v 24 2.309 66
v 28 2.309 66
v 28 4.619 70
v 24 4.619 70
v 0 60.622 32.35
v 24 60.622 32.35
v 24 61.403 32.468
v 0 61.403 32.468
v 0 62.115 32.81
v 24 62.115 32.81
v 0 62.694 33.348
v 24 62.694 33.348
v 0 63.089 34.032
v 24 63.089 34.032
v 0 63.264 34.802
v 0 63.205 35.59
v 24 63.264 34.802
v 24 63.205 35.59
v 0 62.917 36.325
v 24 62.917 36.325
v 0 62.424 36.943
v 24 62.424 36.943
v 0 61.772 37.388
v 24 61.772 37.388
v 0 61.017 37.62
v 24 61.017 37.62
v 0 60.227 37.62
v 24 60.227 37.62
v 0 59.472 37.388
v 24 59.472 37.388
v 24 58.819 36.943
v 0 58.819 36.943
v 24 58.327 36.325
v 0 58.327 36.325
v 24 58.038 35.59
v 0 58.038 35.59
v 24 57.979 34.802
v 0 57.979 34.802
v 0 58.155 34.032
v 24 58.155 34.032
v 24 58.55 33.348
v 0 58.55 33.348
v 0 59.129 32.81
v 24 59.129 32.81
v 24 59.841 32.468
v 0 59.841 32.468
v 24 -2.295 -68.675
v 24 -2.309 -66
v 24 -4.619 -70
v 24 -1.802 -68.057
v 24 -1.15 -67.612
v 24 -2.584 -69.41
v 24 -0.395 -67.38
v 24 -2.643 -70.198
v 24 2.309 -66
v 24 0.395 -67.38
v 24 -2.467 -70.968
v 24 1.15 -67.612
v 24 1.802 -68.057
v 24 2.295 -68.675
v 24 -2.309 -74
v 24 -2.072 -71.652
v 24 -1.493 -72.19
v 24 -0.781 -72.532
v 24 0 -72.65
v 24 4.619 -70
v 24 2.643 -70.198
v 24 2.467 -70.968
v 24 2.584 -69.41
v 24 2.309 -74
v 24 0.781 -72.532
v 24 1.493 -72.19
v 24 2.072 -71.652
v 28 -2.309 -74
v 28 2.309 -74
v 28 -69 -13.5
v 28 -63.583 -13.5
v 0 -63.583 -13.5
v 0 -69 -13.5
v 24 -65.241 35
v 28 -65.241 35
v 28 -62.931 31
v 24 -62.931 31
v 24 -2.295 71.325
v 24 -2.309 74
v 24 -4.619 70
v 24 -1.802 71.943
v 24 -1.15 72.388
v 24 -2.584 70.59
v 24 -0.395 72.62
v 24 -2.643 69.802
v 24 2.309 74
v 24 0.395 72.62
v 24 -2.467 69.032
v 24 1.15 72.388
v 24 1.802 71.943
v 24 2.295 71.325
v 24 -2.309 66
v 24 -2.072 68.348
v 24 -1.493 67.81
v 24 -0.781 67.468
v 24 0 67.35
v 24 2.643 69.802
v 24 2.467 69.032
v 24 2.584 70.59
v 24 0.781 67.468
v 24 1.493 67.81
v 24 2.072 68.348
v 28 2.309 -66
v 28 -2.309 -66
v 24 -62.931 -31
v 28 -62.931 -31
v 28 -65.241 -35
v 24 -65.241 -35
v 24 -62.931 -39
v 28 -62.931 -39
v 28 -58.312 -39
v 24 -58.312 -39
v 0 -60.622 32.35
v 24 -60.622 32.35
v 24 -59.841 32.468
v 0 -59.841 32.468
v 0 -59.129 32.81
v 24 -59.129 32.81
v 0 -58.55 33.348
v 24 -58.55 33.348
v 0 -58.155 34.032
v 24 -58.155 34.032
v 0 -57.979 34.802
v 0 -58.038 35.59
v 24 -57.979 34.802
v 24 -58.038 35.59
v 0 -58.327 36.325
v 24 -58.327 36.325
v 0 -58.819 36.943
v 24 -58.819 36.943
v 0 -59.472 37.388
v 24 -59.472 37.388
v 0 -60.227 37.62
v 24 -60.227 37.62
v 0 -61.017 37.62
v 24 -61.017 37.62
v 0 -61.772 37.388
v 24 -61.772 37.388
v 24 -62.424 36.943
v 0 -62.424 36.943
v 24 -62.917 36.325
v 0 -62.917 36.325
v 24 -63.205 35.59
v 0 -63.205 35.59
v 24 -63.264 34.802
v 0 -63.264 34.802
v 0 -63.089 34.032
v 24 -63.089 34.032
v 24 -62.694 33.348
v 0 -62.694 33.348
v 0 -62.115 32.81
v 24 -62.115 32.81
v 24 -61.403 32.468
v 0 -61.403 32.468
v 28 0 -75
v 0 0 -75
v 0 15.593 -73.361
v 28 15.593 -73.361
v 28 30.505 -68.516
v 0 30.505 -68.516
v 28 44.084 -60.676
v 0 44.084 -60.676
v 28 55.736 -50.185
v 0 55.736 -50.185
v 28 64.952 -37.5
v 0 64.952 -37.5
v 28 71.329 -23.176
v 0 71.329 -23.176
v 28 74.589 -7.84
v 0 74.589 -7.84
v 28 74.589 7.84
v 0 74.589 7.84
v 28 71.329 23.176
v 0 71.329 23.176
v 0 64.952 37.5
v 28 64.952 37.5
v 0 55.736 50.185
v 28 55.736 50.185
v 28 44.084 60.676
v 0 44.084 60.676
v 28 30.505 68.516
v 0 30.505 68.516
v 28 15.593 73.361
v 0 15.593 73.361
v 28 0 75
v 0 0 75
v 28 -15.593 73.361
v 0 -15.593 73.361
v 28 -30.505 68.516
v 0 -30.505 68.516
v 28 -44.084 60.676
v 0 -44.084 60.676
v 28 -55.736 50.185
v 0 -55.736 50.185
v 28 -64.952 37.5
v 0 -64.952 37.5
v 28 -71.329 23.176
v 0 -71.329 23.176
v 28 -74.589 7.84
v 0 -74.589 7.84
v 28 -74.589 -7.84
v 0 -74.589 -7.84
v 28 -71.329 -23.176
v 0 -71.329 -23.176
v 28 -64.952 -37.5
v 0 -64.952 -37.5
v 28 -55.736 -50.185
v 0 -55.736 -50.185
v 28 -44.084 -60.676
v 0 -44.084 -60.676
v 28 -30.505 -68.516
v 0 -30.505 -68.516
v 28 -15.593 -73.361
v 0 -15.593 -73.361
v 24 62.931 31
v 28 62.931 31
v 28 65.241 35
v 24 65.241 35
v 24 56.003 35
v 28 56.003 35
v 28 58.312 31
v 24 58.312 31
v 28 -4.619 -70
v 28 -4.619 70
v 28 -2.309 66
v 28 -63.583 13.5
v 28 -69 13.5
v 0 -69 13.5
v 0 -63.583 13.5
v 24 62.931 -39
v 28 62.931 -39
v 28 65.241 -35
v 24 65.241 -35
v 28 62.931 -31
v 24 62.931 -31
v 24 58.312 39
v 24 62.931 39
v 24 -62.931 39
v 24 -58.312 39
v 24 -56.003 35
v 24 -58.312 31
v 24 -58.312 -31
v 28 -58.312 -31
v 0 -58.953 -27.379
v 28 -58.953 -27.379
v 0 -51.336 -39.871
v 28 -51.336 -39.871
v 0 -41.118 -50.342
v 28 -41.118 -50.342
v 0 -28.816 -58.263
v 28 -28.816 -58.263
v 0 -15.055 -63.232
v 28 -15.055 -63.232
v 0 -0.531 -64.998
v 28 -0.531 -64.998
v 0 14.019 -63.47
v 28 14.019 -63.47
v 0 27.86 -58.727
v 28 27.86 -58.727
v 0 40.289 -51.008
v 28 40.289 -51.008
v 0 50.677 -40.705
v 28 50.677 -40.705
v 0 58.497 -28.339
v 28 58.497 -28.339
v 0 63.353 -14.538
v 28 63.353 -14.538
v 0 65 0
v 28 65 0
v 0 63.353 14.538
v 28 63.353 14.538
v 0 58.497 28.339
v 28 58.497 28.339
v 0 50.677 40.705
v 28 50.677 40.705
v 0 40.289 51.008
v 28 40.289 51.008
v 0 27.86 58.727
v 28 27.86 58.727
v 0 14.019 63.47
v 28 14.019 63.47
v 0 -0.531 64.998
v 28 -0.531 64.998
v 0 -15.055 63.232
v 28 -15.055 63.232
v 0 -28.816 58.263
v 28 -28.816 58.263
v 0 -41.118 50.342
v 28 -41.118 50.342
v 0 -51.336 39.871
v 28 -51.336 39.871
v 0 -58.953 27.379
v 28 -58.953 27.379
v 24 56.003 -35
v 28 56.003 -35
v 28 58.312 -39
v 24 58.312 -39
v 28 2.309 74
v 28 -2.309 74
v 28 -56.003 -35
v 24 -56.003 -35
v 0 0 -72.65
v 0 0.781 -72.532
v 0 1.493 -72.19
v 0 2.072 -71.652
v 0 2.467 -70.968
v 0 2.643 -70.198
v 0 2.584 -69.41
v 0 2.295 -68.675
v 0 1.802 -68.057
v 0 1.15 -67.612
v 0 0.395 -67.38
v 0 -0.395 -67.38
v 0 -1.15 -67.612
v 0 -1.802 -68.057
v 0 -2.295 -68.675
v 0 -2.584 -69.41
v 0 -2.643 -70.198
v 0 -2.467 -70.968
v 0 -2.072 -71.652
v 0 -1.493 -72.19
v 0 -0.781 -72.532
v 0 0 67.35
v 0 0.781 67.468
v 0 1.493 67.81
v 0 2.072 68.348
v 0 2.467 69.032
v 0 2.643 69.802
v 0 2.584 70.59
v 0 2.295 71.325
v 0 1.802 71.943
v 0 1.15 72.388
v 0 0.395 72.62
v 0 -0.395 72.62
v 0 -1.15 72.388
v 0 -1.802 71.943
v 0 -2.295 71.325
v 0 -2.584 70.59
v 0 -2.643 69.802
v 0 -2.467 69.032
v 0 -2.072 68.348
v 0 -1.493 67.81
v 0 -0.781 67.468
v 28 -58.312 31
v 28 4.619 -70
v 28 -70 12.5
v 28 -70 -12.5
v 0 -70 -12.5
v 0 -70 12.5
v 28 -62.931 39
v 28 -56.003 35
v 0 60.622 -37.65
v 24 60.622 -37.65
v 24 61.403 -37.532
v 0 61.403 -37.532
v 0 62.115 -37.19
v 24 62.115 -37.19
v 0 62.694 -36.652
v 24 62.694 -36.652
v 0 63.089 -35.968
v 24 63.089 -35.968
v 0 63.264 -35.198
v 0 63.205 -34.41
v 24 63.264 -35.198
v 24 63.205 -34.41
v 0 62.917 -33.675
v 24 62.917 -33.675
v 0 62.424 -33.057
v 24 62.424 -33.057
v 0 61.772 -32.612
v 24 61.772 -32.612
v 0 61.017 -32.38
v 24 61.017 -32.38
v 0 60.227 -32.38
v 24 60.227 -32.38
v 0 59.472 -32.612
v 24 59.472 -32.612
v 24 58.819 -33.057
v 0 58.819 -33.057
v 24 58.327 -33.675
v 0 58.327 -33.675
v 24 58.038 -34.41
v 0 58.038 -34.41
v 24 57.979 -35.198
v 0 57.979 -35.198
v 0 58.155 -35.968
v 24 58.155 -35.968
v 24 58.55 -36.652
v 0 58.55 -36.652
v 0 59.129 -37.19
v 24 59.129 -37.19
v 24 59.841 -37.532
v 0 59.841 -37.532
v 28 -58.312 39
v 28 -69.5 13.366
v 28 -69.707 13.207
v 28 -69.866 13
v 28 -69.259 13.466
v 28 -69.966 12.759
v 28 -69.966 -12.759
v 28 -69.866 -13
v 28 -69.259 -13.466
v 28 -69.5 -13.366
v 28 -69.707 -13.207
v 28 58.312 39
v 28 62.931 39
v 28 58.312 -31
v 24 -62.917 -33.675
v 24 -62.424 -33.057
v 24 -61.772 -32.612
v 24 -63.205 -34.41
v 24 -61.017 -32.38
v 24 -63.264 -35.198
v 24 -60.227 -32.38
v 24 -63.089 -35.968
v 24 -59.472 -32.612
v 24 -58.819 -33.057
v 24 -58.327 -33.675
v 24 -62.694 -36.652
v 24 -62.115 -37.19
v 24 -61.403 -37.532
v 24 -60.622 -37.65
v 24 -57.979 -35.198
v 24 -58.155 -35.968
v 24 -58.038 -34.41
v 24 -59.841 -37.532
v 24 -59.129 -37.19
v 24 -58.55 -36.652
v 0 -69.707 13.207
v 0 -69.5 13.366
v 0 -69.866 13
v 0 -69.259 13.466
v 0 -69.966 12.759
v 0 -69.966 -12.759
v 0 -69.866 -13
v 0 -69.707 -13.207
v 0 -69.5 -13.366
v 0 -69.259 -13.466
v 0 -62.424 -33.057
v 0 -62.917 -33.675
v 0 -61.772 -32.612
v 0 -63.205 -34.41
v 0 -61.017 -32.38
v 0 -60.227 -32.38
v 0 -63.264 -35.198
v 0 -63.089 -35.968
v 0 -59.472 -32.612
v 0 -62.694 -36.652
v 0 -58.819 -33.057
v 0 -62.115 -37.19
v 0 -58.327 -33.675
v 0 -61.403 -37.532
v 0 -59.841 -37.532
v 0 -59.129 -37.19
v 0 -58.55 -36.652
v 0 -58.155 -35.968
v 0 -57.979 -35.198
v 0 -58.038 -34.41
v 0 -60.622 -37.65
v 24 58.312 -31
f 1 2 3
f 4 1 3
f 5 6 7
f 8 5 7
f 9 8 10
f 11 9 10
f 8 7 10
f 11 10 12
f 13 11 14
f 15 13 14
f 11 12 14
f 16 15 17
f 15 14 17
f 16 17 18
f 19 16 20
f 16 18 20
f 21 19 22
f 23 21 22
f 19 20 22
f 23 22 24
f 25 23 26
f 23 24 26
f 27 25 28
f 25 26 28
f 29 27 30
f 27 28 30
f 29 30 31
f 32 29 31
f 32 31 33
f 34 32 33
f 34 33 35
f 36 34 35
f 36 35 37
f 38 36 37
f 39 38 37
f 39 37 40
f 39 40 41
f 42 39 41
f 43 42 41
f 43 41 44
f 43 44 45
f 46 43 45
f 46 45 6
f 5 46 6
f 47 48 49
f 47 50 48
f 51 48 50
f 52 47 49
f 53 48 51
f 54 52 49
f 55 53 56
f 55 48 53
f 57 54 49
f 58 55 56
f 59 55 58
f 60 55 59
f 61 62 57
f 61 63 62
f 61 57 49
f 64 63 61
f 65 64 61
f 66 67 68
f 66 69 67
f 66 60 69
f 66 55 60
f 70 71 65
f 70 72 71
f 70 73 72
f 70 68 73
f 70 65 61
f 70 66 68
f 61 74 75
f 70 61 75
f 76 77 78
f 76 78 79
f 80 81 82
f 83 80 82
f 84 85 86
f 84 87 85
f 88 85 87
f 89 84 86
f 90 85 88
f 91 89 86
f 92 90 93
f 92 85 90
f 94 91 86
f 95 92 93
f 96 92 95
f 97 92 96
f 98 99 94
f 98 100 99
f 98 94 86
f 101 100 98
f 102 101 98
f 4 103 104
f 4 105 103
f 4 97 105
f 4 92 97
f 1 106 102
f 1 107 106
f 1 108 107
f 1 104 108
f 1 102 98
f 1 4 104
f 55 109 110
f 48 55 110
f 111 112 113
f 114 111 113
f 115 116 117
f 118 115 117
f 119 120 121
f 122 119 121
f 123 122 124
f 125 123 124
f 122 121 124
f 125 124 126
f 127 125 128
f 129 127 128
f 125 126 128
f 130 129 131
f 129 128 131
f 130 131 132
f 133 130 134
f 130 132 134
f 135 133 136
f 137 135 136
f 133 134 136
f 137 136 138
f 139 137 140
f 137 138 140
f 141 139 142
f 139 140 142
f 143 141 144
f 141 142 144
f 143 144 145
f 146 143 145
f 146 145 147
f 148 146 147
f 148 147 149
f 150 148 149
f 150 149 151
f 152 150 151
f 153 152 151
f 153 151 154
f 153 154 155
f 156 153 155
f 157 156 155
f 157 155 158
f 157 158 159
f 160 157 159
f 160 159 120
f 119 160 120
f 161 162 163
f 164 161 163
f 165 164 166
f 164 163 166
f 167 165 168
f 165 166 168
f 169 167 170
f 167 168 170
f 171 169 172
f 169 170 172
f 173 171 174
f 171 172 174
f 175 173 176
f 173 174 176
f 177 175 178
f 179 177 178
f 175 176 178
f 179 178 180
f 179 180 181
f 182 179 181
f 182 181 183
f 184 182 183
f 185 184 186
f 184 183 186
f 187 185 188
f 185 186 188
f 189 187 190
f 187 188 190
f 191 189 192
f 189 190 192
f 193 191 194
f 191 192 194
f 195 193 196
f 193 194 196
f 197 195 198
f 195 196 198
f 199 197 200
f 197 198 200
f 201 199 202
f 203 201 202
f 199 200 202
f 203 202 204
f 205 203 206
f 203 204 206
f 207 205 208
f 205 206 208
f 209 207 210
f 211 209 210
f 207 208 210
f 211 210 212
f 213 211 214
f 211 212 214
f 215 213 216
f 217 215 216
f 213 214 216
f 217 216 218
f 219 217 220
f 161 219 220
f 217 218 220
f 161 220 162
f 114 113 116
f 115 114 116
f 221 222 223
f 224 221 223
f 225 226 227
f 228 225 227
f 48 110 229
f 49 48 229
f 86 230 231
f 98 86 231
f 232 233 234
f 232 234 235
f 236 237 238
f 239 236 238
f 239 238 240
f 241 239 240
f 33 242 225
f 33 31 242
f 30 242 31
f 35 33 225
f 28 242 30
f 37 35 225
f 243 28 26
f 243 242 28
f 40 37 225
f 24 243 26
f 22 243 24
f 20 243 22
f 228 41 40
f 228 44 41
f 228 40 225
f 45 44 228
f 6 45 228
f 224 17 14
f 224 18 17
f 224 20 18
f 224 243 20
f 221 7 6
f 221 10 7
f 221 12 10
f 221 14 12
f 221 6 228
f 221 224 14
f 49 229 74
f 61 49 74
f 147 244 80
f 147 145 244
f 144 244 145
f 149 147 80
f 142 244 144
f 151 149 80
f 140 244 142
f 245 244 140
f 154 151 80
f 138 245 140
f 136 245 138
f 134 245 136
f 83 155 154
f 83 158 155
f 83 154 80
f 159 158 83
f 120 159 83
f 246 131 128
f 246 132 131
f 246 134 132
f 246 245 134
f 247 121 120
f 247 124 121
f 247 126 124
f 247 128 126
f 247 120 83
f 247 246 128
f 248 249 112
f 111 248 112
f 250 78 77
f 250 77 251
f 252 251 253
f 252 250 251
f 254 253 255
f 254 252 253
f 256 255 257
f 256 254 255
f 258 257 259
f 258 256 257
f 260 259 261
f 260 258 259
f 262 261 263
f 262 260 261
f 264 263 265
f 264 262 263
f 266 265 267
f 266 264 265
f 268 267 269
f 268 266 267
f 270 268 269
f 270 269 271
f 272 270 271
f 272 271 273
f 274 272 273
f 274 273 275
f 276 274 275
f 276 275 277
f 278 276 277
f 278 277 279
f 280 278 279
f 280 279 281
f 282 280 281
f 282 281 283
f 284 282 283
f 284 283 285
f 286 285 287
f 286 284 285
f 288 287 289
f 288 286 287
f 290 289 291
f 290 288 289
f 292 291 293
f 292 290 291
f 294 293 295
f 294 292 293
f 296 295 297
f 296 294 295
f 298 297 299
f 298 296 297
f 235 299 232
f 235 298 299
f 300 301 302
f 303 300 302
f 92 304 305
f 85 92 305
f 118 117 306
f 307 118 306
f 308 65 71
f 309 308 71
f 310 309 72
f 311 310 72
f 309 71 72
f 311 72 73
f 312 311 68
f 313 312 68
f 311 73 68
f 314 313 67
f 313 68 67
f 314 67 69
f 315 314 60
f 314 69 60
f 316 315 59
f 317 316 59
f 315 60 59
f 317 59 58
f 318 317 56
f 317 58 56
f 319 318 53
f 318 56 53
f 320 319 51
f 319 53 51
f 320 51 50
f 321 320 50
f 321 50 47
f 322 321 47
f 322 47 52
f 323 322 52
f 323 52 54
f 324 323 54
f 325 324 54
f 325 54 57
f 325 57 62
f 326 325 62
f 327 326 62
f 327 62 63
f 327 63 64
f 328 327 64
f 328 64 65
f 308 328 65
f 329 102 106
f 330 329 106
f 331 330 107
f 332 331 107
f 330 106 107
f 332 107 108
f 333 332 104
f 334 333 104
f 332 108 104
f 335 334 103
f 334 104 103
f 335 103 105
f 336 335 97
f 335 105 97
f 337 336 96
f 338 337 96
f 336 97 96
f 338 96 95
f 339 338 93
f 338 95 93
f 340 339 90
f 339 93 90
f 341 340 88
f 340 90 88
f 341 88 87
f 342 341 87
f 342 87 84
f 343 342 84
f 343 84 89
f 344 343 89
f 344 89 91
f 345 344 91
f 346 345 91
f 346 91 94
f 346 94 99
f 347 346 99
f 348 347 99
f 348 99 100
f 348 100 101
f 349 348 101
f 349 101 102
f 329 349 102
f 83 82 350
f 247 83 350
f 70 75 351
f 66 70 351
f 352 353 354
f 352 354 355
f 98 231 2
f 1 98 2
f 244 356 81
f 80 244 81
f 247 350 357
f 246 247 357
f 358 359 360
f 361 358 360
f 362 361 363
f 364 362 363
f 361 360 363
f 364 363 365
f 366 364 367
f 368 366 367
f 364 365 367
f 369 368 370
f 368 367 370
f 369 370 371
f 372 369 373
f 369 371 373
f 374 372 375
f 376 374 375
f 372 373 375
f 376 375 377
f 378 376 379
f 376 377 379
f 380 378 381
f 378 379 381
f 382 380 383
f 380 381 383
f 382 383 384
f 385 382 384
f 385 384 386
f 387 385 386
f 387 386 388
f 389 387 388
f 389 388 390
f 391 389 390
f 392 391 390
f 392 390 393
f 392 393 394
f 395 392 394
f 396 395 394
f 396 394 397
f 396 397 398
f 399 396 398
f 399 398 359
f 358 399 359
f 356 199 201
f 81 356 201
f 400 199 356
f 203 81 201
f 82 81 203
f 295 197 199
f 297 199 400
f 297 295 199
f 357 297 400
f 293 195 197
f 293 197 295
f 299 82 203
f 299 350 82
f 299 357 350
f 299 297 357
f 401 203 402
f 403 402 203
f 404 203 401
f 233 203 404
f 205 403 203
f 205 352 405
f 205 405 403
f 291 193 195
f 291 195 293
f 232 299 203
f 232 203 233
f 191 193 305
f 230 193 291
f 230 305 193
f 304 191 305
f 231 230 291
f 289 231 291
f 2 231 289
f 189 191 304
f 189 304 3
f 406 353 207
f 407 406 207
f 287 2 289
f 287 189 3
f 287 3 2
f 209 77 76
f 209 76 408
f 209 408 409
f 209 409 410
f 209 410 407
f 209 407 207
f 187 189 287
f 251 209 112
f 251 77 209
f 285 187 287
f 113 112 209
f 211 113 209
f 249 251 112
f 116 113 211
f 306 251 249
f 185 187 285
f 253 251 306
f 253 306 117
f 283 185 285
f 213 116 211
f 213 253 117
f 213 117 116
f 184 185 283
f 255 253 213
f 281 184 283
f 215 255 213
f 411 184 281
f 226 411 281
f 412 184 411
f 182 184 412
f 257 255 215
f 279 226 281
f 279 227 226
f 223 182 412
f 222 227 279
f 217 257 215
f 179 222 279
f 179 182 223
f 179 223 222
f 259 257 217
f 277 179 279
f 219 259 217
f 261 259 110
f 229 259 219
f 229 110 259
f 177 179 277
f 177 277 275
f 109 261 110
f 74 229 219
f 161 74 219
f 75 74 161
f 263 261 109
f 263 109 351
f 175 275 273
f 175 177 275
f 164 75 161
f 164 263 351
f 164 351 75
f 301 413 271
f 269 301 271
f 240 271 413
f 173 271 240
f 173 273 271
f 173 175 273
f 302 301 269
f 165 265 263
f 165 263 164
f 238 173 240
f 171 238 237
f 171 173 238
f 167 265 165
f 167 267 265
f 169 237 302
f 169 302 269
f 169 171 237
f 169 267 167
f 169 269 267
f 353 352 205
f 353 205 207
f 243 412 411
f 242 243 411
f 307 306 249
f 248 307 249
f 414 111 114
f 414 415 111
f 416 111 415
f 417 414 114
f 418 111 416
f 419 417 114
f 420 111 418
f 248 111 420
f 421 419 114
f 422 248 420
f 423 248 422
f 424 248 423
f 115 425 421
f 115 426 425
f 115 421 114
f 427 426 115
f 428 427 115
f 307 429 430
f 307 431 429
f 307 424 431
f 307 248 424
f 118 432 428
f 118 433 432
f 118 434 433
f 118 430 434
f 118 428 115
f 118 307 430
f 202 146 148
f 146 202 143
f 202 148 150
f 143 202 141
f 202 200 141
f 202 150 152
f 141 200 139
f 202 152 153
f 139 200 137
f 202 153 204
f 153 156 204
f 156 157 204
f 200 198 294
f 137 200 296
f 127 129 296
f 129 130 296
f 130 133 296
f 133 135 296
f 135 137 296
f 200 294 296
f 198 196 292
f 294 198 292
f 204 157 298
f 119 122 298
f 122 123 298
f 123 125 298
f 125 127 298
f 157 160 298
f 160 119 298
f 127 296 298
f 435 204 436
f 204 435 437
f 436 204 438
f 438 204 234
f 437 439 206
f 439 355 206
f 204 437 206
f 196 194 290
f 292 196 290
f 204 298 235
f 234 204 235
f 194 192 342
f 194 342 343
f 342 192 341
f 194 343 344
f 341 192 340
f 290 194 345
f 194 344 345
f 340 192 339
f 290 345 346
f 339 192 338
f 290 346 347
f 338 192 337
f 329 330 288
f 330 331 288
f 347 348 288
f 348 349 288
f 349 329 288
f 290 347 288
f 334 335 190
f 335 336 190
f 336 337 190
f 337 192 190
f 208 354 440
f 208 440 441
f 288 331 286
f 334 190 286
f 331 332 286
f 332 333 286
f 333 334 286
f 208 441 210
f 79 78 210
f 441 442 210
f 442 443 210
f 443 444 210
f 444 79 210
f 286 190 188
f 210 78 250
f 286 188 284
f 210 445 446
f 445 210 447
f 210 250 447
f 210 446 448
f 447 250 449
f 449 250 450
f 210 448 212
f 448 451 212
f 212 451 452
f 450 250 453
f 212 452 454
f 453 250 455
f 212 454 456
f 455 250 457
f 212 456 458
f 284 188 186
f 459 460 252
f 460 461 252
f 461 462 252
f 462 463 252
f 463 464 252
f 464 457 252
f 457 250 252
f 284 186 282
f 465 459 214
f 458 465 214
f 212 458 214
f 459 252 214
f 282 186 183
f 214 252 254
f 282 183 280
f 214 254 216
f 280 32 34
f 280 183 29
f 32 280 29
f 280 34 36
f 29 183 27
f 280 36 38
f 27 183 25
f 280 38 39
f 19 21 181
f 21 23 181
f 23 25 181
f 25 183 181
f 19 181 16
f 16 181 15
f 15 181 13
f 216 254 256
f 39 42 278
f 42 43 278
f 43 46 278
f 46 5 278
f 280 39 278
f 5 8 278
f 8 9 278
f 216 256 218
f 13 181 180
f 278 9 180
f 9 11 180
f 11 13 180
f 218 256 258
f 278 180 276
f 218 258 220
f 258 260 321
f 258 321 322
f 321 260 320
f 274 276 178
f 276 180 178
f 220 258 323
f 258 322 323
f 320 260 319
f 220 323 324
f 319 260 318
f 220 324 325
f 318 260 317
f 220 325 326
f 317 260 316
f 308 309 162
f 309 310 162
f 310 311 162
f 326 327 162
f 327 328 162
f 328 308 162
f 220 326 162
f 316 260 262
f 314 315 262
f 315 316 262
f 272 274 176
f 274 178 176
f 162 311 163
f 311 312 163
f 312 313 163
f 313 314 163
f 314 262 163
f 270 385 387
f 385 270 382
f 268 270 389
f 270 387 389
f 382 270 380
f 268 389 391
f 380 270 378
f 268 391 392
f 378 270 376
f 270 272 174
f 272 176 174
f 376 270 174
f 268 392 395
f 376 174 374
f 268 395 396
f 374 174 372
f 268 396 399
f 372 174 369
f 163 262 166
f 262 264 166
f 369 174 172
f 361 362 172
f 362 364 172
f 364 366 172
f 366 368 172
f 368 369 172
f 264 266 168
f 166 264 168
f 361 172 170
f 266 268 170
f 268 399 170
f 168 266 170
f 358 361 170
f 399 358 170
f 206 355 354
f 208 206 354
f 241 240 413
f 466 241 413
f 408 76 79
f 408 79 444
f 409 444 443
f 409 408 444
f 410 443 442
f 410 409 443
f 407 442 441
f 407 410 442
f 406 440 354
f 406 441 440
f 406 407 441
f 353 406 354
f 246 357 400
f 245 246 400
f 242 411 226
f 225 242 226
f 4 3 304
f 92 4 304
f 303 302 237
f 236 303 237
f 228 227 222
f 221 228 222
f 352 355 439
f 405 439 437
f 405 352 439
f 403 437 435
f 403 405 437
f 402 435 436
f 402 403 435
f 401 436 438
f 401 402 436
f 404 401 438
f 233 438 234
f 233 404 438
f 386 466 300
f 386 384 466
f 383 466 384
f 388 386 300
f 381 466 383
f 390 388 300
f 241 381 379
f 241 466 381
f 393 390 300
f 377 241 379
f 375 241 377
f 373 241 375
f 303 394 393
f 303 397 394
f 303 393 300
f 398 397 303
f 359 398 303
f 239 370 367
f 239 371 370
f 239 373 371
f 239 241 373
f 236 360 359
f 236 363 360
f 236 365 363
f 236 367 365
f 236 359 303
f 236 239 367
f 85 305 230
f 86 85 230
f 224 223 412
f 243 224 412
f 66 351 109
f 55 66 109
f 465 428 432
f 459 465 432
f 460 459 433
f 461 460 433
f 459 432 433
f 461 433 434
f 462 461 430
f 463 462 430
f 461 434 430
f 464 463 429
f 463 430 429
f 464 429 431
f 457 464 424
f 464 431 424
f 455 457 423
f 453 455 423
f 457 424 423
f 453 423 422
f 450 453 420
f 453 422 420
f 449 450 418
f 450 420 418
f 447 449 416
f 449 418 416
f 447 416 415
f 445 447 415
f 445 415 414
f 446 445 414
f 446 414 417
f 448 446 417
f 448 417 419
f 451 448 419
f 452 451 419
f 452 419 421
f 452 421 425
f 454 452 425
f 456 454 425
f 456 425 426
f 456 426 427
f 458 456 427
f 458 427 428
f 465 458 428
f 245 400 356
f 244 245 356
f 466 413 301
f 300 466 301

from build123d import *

# Parameters (mm, degrees)
SKETCH1_R           = 75
SKETCH1_R_2         = 65
BOSS_EXTRUDE1_DEPTH = 28
CUT_EXTRUDE1_REACH  = 111.7
CUT_EXTRUDE2_REACH  = 111.7
SKETCH3_R           = 2.65
CUT_EXTRUDE3_DEPTH  = 4


with BuildPart() as part:
    # Sketch1 → Boss-Extrude1 (new body)
    with BuildSketch(Plane(origin=(0, 0, 0), x_dir=(0, 0, -1), z_dir=(1, 0, 0))):
        Circle(SKETCH1_R)
        Circle(SKETCH1_R_2, mode=Mode.SUBTRACT)
    extrude(amount=BOSS_EXTRUDE1_DEPTH)

    # Sketch2 → Cut-Extrude1 (cut, up to next)
    with BuildSketch(Plane(origin=(28, 0, 0), x_dir=(0, 0, -1), z_dir=(1, 0, 0)), mode=Mode.PRIVATE) as cut_extrude1_sk1:
        with BuildLine():
            Line((-13.5, -51.893967527), (13.5, -51.893967527))
            Line((13.5, -51.893967527), (13.5, -69))
            ThreePointArc((13.5, -69), (13.207106781, -69.707106781), (12.5, -70))
            Line((12.5, -70), (-12.5, -70))
            ThreePointArc((-12.5, -70), (-13.207106781, -69.707106781), (-13.5, -69))
            Line((-13.5, -69), (-13.5, -51.893967527))
        make_face()
    cut_extrude1_tool1 = extrude(cut_extrude1_sk1.sketch, amount=-CUT_EXTRUDE1_REACH, mode=Mode.PRIVATE) & part.part
    add(cut_extrude1_tool1.solids().sort_by_distance((28, -60.939225, 0))[0], mode=Mode.SUBTRACT)

    # Sketch3 → Cut-Extrude2 (cut, up to next)
    with BuildSketch(Plane(origin=(28, 0, 0), x_dir=(0, 0, -1), z_dir=(1, 0, 0)), mode=Mode.PRIVATE) as cut_extrude2_sk1:
        with Locations((-70, 0)):
            Circle(SKETCH3_R)
    cut_extrude2_tool1 = extrude(cut_extrude2_sk1.sketch, amount=-CUT_EXTRUDE2_REACH, mode=Mode.PRIVATE) & part.part
    # Sketch3 → Cut-Extrude2 (cut, up to next)
    with BuildSketch(Plane(origin=(28, 0, 0), x_dir=(0, 0, -1), z_dir=(1, 0, 0)), mode=Mode.PRIVATE) as cut_extrude2_sk2:
        with Locations((-35, 60.621778265)):
            Circle(SKETCH3_R)
    cut_extrude2_tool2 = extrude(cut_extrude2_sk2.sketch, amount=-CUT_EXTRUDE2_REACH, mode=Mode.PRIVATE) & part.part
    # Sketch3 → Cut-Extrude2 (cut, up to next)
    with BuildSketch(Plane(origin=(28, 0, 0), x_dir=(0, 0, -1), z_dir=(1, 0, 0)), mode=Mode.PRIVATE) as cut_extrude2_sk3:
        with Locations((35, 60.621778265)):
            Circle(SKETCH3_R)
    cut_extrude2_tool3 = extrude(cut_extrude2_sk3.sketch, amount=-CUT_EXTRUDE2_REACH, mode=Mode.PRIVATE) & part.part
    # Sketch3 → Cut-Extrude2 (cut, up to next)
    with BuildSketch(Plane(origin=(28, 0, 0), x_dir=(0, 0, -1), z_dir=(1, 0, 0)), mode=Mode.PRIVATE) as cut_extrude2_sk4:
        with Locations((70, 0)):
            Circle(SKETCH3_R)
    cut_extrude2_tool4 = extrude(cut_extrude2_sk4.sketch, amount=-CUT_EXTRUDE2_REACH, mode=Mode.PRIVATE) & part.part
    # Sketch3 → Cut-Extrude2 (cut, up to next)
    with BuildSketch(Plane(origin=(28, 0, 0), x_dir=(0, 0, -1), z_dir=(1, 0, 0)), mode=Mode.PRIVATE) as cut_extrude2_sk5:
        with Locations((35, -60.621778265)):
            Circle(SKETCH3_R)
    cut_extrude2_tool5 = extrude(cut_extrude2_sk5.sketch, amount=-CUT_EXTRUDE2_REACH, mode=Mode.PRIVATE) & part.part
    # Sketch3 → Cut-Extrude2 (cut, up to next)
    with BuildSketch(Plane(origin=(28, 0, 0), x_dir=(0, 0, -1), z_dir=(1, 0, 0)), mode=Mode.PRIVATE) as cut_extrude2_sk6:
        with Locations((-35, -60.621778265)):
            Circle(SKETCH3_R)
    cut_extrude2_tool6 = extrude(cut_extrude2_sk6.sketch, amount=-CUT_EXTRUDE2_REACH, mode=Mode.PRIVATE) & part.part
    add(cut_extrude2_tool1.solids().sort_by_distance((28, 0, 70))[0], mode=Mode.SUBTRACT)
    add(cut_extrude2_tool2.solids().sort_by_distance((28, 60.621778, 35))[0], mode=Mode.SUBTRACT)
    add(cut_extrude2_tool3.solids().sort_by_distance((28, 60.621778, -35))[0], mode=Mode.SUBTRACT)
    add(cut_extrude2_tool4.solids().sort_by_distance((28, 0, -70))[0], mode=Mode.SUBTRACT)
    add(cut_extrude2_tool5.solids().sort_by_distance((28, -60.621778, -35))[0], mode=Mode.SUBTRACT)
    add(cut_extrude2_tool6.solids().sort_by_distance((28, -60.621778, 35))[0], mode=Mode.SUBTRACT)

    # Sketch4 → Cut-Extrude3 (cut)
    with BuildSketch(Plane(origin=(28, 0, 0), x_dir=(0, 0, -1), z_dir=(1, 0, 0))):
        Polygon((-39, 58.312377188), (-35, 56.002976111), (-31, 58.312377188), (-31, 62.931179342), (-35, 65.240580418), (-39, 62.931179342), align=None)
        Polygon((-70, -4.618802154), (-66, -2.309401077), (-66, 2.309401077), (-70, 4.618802154), (-74, 2.309401077), (-74, -2.309401077), align=None)
        Polygon((31, 62.931179342), (31, 58.312377188), (35, 56.002976111), (39, 58.312377188), (39, 62.931179342), (35, 65.240580418), align=None)
        Polygon((70, 4.618802154), (66, 2.309401077), (66, -2.309401077), (70, -4.618802154), (74, -2.309401077), (74, 2.309401077), align=None)
        Polygon((39, -58.312377188), (35, -56.002976111), (31, -58.312377188), (31, -62.931179342), (35, -65.240580418), (39, -62.931179342), align=None)
        Polygon((-31, -62.931179342), (-31, -58.312377188), (-35, -56.002976111), (-39, -58.312377188), (-39, -62.931179342), (-35, -65.240580418), align=None)
    extrude(amount=-CUT_EXTRUDE3_DEPTH, mode=Mode.SUBTRACT)


solid = part.part
